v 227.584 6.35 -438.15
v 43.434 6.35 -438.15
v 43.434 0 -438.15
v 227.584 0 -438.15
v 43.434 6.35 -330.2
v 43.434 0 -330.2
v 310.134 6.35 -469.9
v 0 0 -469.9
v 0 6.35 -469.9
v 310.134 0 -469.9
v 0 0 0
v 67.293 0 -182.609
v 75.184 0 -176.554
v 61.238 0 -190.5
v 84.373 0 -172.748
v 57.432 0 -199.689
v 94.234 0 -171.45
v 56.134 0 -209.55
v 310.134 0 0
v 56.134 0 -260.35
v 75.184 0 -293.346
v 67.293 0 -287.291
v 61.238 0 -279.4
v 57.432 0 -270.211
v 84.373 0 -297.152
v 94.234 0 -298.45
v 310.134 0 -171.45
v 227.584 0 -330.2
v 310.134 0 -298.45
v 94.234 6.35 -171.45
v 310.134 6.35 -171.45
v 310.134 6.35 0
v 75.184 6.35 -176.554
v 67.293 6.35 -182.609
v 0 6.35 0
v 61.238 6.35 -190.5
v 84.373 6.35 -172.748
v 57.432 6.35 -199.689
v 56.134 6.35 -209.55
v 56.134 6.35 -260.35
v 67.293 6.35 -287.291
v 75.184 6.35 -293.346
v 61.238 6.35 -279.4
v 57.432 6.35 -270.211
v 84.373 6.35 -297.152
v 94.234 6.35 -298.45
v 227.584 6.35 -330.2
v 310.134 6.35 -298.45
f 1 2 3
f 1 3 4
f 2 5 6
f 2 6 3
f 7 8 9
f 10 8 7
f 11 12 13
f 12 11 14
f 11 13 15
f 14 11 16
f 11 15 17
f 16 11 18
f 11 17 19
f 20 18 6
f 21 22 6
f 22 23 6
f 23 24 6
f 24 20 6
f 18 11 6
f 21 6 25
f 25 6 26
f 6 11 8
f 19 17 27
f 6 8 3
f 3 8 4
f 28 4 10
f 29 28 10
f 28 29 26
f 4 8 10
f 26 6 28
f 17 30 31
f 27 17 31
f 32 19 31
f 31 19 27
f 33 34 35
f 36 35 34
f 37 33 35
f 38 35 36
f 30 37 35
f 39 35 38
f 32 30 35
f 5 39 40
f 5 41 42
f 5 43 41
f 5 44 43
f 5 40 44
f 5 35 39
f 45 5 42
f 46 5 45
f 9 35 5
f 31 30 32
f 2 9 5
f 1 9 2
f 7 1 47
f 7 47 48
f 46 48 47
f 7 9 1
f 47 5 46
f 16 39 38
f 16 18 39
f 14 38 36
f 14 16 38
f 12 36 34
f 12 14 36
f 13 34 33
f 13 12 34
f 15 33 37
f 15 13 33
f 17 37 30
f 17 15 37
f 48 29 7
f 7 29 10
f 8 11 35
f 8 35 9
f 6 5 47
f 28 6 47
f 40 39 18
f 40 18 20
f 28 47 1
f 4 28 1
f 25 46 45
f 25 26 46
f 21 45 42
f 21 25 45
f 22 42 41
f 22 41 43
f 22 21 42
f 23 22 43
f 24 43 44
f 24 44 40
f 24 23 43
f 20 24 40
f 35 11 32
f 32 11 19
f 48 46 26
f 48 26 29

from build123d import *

# Parameters (mm, degrees)
SKETCH1_W           = 310.134
SKETCH1_H           = 469.9
BOSS_EXTRUDE1_DEPTH = 6.35
SKETCH2_W           = 254
SKETCH2_H           = 127
CUT_EXTRUDE1_DEPTH  = 564.053665698
FILLET1_R           = 38.1
SKETCH3_W           = 184.15
SKETCH3_H           = 107.95
CUT_EXTRUDE2_DEPTH  = 564.053665698


with BuildPart() as part:
    # Sketch1 → Boss-Extrude1 (new body)
    with BuildSketch(Plane(origin=(0, 0, 0), x_dir=(1, 0, 0), z_dir=(0, 1, 0))):
        with Locations((155.067, 234.95)):
            Rectangle(SKETCH1_W, SKETCH1_H)
    extrude(amount=BOSS_EXTRUDE1_DEPTH)

    # Sketch2 → Cut-Extrude1 (cut, through all)
    with BuildSketch(Plane(origin=(0, 6.35, 0), x_dir=(1, 0, 0), z_dir=(0, 1, 0))):
        with Locations((183.134, 234.95)):
            Rectangle(SKETCH2_W, SKETCH2_H)
    extrude(amount=-CUT_EXTRUDE1_DEPTH, mode=Mode.SUBTRACT)

    # Fillet1
    fillet1_edges = [part.edges().sort_by_distance(p)[0] for p in [
        (56.134, 3.175, -171.45),
        (56.134, 3.175, -298.45),
    ]]
    fillet(fillet1_edges, radius=FILLET1_R)

    # Sketch3 → Cut-Extrude2 (cut, through all)
    with BuildSketch(Plane(origin=(0, 6.35, 0), x_dir=(1, 0, 0), z_dir=(0, 1, 0))):
        with Locations((135.509, 384.175)):
            Rectangle(SKETCH3_W, SKETCH3_H)
    extrude(amount=-CUT_EXTRUDE2_DEPTH, mode=Mode.SUBTRACT)


solid = part.part
